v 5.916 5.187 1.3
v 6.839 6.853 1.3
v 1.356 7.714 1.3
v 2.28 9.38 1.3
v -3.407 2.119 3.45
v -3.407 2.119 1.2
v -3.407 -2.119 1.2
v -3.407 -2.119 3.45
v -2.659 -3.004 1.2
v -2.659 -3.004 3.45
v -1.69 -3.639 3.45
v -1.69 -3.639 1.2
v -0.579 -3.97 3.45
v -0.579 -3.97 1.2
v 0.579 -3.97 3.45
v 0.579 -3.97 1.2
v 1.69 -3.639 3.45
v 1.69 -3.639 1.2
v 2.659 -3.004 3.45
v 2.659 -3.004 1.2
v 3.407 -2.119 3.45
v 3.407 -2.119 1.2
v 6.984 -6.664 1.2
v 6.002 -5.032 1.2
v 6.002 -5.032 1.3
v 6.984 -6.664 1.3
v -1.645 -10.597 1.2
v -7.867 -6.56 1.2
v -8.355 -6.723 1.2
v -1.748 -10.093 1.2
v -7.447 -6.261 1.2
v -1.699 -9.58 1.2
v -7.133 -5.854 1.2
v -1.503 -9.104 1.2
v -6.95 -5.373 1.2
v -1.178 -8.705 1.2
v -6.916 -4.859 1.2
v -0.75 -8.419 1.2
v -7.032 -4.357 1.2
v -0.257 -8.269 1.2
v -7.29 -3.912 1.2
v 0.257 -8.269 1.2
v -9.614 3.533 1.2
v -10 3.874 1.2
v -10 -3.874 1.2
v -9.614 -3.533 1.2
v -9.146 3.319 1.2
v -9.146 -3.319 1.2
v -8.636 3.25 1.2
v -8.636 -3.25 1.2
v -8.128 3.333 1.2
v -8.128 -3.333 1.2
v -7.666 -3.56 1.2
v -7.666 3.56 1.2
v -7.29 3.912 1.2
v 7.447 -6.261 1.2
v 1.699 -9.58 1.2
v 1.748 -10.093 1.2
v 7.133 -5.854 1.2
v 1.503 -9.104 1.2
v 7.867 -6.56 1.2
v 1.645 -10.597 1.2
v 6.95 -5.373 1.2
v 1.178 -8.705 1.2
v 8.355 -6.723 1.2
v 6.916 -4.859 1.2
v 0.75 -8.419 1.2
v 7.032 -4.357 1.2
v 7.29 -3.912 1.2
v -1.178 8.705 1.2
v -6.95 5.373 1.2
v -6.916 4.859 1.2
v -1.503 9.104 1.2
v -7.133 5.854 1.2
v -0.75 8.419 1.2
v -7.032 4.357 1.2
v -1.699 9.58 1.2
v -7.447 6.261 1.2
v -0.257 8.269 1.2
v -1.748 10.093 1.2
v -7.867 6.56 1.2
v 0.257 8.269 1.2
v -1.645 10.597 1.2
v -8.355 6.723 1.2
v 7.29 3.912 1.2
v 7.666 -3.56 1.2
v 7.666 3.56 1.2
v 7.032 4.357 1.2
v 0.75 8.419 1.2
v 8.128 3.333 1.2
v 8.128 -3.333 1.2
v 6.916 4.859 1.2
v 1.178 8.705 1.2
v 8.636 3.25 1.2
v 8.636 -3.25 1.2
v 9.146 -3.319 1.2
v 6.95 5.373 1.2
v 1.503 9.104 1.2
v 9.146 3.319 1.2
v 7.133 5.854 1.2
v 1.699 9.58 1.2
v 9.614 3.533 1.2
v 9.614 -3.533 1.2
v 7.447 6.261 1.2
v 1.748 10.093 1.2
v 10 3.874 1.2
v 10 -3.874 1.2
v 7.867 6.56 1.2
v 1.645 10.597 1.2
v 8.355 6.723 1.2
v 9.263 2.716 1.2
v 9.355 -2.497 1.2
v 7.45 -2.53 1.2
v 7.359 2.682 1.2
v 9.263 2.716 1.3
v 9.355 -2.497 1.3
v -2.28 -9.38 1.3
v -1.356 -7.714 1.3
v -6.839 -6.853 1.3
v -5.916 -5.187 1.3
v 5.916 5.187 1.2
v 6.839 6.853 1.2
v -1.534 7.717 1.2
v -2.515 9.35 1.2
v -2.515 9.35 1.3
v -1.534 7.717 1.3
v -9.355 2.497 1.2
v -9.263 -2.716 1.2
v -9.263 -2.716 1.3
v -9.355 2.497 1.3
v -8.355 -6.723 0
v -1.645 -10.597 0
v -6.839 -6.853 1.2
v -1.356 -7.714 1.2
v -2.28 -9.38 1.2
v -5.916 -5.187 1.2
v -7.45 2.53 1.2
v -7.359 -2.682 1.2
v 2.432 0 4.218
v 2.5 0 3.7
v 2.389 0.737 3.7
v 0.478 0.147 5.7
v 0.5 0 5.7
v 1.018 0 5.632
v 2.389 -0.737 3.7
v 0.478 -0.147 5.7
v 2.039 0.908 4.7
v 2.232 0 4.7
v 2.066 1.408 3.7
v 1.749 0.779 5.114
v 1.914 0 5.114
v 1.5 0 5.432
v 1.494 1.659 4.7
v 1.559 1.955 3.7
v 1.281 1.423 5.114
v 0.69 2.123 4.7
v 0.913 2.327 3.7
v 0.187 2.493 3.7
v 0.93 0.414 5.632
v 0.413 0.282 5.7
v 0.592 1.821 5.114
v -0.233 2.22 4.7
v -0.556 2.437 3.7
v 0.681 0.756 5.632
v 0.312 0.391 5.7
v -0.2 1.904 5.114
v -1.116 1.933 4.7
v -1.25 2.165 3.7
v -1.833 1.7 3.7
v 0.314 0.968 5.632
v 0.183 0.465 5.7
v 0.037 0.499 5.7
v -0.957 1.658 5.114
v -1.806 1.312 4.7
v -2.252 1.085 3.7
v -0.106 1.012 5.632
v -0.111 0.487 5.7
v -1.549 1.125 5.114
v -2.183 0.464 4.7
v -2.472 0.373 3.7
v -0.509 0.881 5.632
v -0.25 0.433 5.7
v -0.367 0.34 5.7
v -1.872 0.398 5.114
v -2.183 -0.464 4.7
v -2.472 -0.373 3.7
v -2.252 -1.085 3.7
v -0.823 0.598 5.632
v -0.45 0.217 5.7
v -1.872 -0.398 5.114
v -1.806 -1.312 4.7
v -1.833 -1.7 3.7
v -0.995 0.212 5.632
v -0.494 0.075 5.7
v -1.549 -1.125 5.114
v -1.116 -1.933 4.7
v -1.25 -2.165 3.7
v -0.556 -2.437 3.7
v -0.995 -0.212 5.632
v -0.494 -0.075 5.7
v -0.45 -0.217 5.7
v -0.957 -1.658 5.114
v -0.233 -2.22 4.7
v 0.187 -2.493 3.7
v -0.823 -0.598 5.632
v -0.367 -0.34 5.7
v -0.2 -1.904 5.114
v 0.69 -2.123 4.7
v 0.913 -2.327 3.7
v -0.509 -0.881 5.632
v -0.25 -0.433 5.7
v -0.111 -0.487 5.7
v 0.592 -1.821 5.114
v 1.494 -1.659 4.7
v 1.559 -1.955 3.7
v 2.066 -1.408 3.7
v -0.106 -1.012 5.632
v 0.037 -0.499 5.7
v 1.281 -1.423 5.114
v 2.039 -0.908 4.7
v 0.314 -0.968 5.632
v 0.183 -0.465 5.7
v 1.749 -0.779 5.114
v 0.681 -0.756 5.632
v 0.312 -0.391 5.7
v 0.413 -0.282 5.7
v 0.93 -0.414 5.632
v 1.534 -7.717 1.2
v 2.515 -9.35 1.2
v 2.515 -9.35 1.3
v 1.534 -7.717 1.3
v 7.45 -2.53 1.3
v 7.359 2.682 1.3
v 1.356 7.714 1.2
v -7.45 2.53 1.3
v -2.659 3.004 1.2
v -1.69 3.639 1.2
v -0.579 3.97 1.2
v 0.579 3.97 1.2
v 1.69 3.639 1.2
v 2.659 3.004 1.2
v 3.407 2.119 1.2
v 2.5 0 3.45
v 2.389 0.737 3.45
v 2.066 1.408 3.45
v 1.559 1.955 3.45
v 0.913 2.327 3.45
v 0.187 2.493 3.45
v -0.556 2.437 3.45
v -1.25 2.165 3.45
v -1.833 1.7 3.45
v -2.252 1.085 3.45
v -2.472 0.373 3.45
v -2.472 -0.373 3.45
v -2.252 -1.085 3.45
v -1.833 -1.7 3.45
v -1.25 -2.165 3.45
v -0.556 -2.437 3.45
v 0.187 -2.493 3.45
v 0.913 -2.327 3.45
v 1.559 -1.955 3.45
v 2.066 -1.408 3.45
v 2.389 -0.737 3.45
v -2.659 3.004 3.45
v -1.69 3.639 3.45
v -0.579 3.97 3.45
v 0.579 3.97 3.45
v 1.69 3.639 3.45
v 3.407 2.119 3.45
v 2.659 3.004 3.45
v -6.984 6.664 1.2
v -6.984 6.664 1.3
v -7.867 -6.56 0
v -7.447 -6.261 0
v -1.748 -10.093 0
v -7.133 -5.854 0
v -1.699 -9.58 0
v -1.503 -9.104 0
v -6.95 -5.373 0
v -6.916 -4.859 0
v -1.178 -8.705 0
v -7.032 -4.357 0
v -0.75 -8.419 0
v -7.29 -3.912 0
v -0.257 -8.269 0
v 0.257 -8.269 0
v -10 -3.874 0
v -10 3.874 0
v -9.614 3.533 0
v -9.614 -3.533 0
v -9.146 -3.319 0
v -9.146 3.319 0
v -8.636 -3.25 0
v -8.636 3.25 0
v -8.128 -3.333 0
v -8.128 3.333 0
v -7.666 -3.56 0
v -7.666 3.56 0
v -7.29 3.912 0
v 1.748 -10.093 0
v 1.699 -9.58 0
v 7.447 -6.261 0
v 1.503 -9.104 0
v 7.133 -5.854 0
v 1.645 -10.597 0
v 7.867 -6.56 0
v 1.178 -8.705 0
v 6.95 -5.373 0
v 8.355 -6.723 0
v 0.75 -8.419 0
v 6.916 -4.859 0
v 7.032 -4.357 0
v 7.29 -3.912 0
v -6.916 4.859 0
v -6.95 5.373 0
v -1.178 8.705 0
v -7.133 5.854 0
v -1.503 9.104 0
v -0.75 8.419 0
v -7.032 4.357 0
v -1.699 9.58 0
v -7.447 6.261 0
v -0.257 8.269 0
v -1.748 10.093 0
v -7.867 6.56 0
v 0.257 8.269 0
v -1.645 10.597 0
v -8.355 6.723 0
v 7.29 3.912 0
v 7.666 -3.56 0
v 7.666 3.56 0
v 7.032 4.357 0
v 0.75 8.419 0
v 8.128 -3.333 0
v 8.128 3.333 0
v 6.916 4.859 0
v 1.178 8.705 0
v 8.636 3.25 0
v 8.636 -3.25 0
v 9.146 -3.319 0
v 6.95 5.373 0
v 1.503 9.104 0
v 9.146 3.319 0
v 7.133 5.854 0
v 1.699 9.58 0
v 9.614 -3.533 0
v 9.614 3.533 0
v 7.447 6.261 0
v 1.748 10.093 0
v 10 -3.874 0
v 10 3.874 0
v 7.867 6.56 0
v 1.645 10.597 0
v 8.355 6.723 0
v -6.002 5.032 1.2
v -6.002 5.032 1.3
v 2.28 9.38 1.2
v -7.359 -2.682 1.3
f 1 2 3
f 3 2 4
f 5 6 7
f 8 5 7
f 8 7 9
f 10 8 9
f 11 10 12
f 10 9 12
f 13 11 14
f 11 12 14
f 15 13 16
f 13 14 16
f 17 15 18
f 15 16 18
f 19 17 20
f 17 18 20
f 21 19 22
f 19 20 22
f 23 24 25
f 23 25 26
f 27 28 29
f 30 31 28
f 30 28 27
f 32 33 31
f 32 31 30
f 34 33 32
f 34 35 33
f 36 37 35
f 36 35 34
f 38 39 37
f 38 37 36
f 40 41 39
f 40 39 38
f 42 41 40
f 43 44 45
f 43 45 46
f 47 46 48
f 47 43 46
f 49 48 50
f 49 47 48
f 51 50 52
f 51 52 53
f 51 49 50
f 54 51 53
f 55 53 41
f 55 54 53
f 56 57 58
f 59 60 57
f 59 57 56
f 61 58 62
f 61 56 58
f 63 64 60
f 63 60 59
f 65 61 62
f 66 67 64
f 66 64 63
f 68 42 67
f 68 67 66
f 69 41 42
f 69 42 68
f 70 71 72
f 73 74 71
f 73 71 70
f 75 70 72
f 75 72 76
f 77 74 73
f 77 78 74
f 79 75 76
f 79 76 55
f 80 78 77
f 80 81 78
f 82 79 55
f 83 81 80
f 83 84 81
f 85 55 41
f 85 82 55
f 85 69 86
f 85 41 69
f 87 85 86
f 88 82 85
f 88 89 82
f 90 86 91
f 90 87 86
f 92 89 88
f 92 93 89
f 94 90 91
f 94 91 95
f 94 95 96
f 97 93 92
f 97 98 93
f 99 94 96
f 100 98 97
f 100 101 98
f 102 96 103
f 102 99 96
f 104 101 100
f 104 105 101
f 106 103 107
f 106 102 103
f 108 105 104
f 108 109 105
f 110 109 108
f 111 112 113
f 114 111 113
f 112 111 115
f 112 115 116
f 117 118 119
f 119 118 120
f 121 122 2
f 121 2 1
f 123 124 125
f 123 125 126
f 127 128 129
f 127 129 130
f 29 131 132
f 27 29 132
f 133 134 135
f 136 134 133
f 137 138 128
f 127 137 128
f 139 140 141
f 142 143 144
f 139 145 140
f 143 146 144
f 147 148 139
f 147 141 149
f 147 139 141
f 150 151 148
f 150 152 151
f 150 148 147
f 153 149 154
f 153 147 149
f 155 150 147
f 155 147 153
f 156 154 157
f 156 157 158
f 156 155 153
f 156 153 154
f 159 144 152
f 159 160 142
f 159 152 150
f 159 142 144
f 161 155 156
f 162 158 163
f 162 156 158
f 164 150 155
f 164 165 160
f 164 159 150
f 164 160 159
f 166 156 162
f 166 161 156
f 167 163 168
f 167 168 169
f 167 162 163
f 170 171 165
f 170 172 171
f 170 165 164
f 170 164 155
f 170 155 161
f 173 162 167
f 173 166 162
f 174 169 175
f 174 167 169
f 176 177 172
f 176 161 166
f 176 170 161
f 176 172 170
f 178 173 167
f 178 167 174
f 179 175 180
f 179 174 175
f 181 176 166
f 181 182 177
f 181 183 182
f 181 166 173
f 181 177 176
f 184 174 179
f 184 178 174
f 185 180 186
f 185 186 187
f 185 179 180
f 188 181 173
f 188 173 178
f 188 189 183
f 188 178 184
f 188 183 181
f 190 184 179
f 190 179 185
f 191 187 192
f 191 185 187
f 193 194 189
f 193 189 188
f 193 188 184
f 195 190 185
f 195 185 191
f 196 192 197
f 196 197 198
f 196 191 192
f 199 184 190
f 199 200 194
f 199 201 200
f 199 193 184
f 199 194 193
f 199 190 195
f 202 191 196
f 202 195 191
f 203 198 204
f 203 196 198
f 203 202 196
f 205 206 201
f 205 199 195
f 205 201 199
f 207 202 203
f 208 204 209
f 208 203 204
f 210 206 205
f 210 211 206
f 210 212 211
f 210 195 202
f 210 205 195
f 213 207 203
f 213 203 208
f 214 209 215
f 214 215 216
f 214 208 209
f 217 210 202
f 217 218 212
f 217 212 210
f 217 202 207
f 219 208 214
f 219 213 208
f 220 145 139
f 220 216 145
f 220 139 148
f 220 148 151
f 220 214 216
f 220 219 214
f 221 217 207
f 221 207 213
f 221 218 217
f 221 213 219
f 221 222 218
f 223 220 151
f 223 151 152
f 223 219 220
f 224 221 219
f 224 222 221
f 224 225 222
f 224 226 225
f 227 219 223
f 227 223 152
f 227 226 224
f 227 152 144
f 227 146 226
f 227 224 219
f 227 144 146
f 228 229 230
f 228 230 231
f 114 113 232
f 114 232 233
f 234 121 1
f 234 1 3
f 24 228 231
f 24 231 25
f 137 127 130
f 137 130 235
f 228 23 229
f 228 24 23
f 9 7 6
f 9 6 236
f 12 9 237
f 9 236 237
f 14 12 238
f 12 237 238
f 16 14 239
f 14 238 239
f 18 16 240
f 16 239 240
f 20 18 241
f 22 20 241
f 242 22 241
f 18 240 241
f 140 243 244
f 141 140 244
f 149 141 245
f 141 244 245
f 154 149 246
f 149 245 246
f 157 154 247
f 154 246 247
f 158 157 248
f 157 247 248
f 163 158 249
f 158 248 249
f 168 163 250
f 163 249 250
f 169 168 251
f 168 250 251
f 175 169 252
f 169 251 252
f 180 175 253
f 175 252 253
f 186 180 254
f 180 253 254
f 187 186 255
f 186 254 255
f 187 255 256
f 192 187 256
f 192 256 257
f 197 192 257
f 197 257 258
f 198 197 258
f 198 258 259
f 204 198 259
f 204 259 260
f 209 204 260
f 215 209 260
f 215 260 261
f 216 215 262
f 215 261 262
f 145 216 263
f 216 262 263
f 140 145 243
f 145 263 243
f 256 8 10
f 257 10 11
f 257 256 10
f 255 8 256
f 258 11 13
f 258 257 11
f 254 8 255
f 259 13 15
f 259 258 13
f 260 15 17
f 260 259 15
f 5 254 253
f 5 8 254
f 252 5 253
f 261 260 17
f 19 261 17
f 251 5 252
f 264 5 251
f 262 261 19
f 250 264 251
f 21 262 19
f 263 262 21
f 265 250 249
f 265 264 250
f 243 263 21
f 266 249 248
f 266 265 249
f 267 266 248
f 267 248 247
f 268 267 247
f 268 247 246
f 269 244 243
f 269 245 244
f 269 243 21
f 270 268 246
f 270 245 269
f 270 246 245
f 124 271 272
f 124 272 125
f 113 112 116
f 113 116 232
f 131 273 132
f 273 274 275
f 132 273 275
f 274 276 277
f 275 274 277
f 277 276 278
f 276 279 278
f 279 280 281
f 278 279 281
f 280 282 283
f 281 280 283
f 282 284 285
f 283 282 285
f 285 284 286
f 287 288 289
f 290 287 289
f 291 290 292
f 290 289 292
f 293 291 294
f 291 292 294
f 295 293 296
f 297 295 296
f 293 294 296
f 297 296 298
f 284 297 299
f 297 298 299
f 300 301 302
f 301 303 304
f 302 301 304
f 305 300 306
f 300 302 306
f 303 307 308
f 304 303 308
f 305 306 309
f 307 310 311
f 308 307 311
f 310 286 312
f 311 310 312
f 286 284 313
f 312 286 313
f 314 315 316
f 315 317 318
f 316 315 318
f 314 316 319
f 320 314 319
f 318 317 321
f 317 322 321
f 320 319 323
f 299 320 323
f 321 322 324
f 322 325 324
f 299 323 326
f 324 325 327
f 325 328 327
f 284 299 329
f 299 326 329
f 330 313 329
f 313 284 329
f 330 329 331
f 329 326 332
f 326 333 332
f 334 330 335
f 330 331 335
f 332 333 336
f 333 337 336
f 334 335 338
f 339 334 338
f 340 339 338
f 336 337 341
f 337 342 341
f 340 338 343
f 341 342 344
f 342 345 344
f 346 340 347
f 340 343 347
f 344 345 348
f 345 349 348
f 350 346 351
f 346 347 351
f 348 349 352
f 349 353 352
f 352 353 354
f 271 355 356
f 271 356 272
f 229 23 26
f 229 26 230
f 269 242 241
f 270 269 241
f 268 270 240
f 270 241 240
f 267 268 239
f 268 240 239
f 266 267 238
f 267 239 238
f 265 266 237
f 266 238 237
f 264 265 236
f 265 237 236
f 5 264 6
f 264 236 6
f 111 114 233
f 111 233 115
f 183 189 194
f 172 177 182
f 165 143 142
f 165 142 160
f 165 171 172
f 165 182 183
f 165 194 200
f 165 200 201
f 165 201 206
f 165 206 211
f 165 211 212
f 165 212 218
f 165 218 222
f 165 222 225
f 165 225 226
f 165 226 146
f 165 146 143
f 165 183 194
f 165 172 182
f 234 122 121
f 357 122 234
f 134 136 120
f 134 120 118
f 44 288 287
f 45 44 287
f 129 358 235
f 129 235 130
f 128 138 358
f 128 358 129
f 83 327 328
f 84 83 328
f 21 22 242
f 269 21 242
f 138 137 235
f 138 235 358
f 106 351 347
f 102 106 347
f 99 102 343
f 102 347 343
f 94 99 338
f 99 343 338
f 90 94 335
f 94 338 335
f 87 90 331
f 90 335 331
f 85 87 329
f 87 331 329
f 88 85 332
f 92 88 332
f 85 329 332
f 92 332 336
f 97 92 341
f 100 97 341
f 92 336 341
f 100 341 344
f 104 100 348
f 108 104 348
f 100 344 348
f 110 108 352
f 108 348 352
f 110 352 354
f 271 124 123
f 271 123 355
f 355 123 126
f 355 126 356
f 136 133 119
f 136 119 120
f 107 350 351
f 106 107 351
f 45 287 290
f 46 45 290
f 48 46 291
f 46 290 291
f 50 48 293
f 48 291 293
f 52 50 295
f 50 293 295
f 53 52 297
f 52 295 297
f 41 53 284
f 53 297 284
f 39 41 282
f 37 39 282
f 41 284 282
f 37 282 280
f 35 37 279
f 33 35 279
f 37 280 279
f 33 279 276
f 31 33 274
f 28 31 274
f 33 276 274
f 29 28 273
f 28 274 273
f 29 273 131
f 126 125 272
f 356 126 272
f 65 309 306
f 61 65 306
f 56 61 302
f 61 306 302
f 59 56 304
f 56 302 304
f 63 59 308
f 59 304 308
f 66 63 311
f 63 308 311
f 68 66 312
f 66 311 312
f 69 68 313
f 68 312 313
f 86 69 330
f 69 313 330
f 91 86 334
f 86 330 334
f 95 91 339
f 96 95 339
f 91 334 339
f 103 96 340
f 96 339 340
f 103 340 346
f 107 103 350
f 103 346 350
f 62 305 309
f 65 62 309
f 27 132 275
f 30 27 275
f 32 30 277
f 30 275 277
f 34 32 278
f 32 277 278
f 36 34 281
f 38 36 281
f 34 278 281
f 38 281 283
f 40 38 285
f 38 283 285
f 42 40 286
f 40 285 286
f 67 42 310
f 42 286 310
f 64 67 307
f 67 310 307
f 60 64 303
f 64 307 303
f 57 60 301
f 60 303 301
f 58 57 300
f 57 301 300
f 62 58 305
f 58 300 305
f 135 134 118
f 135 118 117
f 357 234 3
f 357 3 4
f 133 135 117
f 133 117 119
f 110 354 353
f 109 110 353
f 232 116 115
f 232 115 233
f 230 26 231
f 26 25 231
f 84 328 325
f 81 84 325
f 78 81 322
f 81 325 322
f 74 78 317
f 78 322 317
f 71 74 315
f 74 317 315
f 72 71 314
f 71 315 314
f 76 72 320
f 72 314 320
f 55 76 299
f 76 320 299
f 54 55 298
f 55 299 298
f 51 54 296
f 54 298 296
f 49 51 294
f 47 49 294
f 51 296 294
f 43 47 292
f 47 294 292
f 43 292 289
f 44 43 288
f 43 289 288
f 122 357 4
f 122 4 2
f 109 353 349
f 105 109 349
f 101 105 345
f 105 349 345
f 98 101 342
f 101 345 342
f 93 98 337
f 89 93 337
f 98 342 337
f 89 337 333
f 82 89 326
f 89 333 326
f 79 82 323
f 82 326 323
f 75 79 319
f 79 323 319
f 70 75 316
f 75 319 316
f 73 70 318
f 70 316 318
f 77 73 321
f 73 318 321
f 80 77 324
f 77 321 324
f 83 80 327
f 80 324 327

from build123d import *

# Parameters (mm, degrees)
SALIENTE_EXTRUIR1_DEPTH   = 1.2
SALIENTE_EXTRUIR2_DEPTH   = 0.1
SALIENTE_EXTRUIR2_2_DEPTH = 0.1
SALIENTE_EXTRUIR2_3_DEPTH = 0.1
SALIENTE_EXTRUIR2_4_DEPTH = 0.1
SALIENTE_EXTRUIR2_5_DEPTH = 0.1
SALIENTE_EXTRUIR2_6_DEPTH = 0.1
SALIENTE_EXTRUIR3_DEPTH   = 2.25
CROQUIS4_R                = 2.5
SALIENTE_EXTRUIR4_DEPTH   = 2.25
REDONDEO4_R               = 2


with BuildPart() as part:
    # Croquis1 → Saliente-Extruir1 (new body)
    with BuildSketch(Plane.XY):
        with BuildLine():
            Line((-10, 3.87413111), (-10, -3.87413111))
            ThreePointArc((-10, -3.87413111), (-7.144709581, -4.125), (-8.355095959, -6.723188483))
            Line((-8.355095959, -6.723188483), (-1.644904041, -10.597319593))
            ThreePointArc((-1.644904041, -10.597319593), (0, -8.25), (1.644904041, -10.597319593))
            Line((1.644904041, -10.597319593), (8.355095959, -6.723188483))
            ThreePointArc((8.355095959, -6.723188483), (7.144709581, -4.125), (10, -3.87413111))
            Line((10, -3.87413111), (10, 3.87413111))
            ThreePointArc((10, 3.87413111), (7.144709581, 4.125), (8.355095959, 6.723188483))
            Line((8.355095959, 6.723188483), (1.644904041, 10.597319593))
            ThreePointArc((1.644904041, 10.597319593), (0, 8.25), (-1.644904041, 10.597319593))
            Line((-1.644904041, 10.597319593), (-8.355095959, 6.723188483))
            ThreePointArc((-8.355095959, 6.723188483), (-7.144709581, 4.125), (-10, 3.87413111))
        make_face()
    extrude(amount=SALIENTE_EXTRUIR1_DEPTH)


with BuildPart() as body_2:
    # Croquis2 → Saliente-Extruir2 (new body)
    with BuildSketch(Plane.XY.offset(1.2)):
        Polygon((2.279814444, 9.380200395), (6.839443333, 6.853177155), (5.916048556, 5.187051796), (1.356419667, 7.714075036), align=None)
    extrude(amount=SALIENTE_EXTRUIR2_DEPTH)


with BuildPart() as body_3:
    # Croquis2 → Saliente-Extruir2 2 (new body)
    with BuildSketch(Plane.XY.offset(1.2)):
        Polygon((9.263399056, 2.715722973), (9.354747179, -2.496543097), (7.450142904, -2.529922441), (7.358794781, 2.682343628), align=None)
    extrude(amount=SALIENTE_EXTRUIR2_2_DEPTH)


with BuildPart() as body_4:
    # Croquis2 → Saliente-Extruir2 3 (new body)
    with BuildSketch(Plane.XY.offset(1.2)):
        Polygon((6.983584612, -6.664477422), (2.515303846, -9.349720252), (1.534094348, -7.716974237), (6.002375114, -5.031731408), align=None)
    extrude(amount=SALIENTE_EXTRUIR2_3_DEPTH)


with BuildPart() as body_5:
    # Croquis2 → Saliente-Extruir2 4 (new body)
    with BuildSketch(Plane.XY.offset(1.2)):
        Polygon((-2.279814444, -9.380200395), (-6.839443333, -6.853177155), (-5.916048556, -5.187051796), (-1.356419667, -7.714075036), align=None)
    extrude(amount=SALIENTE_EXTRUIR2_4_DEPTH)


with BuildPart() as body_6:
    # Croquis2 → Saliente-Extruir2 5 (new body)
    with BuildSketch(Plane.XY.offset(1.2)):
        Polygon((-9.263399056, -2.715722973), (-9.354747179, 2.496543097), (-7.450142904, 2.529922441), (-7.358794781, -2.682343628), align=None)
    extrude(amount=SALIENTE_EXTRUIR2_5_DEPTH)


with BuildPart() as body_7:
    # Croquis2 → Saliente-Extruir2 6 (new body)
    with BuildSketch(Plane.XY.offset(1.2)):
        Polygon((-6.983584612, 6.664477422), (-2.515303846, 9.349720252), (-1.534094348, 7.716974237), (-6.002375114, 5.031731408), align=None)
    extrude(amount=SALIENTE_EXTRUIR2_6_DEPTH)


with BuildPart() as body_8:
    # Croquis3 → Saliente-Extruir3 (new body)
    with BuildSketch(Plane.XY.offset(1.2)):
        with BuildLine():
            Line((-3.406583147, 2.118728542), (-3.406583147, -2.118728542))
            ThreePointArc((-3.406583147, -2.118728542), (0, -4.01171028), (3.406583147, -2.118728542))
            Line((3.406583147, -2.118728542), (3.406583147, 2.118728542))
            ThreePointArc((3.406583147, 2.118728542), (0, 4.01171028), (-3.406583147, 2.118728542))
        make_face()
    extrude(amount=SALIENTE_EXTRUIR3_DEPTH)

    # Croquis4 → Saliente-Extruir4 (add)
    with BuildSketch(Plane.XY.offset(3.45)):
        Circle(CROQUIS4_R)
    extrude(amount=SALIENTE_EXTRUIR4_DEPTH)

    # Redondeo4
    redondeo4_edges = [body_8.edges().sort_by_distance(p)[0] for p in [
        (-2.5, 0, 5.7),
    ]]
    fillet(redondeo4_edges, radius=REDONDEO4_R)


solid = Compound([part.part, body_2.part, body_3.part, body_4.part, body_5.part, body_6.part, body_7.part, body_8.part])
